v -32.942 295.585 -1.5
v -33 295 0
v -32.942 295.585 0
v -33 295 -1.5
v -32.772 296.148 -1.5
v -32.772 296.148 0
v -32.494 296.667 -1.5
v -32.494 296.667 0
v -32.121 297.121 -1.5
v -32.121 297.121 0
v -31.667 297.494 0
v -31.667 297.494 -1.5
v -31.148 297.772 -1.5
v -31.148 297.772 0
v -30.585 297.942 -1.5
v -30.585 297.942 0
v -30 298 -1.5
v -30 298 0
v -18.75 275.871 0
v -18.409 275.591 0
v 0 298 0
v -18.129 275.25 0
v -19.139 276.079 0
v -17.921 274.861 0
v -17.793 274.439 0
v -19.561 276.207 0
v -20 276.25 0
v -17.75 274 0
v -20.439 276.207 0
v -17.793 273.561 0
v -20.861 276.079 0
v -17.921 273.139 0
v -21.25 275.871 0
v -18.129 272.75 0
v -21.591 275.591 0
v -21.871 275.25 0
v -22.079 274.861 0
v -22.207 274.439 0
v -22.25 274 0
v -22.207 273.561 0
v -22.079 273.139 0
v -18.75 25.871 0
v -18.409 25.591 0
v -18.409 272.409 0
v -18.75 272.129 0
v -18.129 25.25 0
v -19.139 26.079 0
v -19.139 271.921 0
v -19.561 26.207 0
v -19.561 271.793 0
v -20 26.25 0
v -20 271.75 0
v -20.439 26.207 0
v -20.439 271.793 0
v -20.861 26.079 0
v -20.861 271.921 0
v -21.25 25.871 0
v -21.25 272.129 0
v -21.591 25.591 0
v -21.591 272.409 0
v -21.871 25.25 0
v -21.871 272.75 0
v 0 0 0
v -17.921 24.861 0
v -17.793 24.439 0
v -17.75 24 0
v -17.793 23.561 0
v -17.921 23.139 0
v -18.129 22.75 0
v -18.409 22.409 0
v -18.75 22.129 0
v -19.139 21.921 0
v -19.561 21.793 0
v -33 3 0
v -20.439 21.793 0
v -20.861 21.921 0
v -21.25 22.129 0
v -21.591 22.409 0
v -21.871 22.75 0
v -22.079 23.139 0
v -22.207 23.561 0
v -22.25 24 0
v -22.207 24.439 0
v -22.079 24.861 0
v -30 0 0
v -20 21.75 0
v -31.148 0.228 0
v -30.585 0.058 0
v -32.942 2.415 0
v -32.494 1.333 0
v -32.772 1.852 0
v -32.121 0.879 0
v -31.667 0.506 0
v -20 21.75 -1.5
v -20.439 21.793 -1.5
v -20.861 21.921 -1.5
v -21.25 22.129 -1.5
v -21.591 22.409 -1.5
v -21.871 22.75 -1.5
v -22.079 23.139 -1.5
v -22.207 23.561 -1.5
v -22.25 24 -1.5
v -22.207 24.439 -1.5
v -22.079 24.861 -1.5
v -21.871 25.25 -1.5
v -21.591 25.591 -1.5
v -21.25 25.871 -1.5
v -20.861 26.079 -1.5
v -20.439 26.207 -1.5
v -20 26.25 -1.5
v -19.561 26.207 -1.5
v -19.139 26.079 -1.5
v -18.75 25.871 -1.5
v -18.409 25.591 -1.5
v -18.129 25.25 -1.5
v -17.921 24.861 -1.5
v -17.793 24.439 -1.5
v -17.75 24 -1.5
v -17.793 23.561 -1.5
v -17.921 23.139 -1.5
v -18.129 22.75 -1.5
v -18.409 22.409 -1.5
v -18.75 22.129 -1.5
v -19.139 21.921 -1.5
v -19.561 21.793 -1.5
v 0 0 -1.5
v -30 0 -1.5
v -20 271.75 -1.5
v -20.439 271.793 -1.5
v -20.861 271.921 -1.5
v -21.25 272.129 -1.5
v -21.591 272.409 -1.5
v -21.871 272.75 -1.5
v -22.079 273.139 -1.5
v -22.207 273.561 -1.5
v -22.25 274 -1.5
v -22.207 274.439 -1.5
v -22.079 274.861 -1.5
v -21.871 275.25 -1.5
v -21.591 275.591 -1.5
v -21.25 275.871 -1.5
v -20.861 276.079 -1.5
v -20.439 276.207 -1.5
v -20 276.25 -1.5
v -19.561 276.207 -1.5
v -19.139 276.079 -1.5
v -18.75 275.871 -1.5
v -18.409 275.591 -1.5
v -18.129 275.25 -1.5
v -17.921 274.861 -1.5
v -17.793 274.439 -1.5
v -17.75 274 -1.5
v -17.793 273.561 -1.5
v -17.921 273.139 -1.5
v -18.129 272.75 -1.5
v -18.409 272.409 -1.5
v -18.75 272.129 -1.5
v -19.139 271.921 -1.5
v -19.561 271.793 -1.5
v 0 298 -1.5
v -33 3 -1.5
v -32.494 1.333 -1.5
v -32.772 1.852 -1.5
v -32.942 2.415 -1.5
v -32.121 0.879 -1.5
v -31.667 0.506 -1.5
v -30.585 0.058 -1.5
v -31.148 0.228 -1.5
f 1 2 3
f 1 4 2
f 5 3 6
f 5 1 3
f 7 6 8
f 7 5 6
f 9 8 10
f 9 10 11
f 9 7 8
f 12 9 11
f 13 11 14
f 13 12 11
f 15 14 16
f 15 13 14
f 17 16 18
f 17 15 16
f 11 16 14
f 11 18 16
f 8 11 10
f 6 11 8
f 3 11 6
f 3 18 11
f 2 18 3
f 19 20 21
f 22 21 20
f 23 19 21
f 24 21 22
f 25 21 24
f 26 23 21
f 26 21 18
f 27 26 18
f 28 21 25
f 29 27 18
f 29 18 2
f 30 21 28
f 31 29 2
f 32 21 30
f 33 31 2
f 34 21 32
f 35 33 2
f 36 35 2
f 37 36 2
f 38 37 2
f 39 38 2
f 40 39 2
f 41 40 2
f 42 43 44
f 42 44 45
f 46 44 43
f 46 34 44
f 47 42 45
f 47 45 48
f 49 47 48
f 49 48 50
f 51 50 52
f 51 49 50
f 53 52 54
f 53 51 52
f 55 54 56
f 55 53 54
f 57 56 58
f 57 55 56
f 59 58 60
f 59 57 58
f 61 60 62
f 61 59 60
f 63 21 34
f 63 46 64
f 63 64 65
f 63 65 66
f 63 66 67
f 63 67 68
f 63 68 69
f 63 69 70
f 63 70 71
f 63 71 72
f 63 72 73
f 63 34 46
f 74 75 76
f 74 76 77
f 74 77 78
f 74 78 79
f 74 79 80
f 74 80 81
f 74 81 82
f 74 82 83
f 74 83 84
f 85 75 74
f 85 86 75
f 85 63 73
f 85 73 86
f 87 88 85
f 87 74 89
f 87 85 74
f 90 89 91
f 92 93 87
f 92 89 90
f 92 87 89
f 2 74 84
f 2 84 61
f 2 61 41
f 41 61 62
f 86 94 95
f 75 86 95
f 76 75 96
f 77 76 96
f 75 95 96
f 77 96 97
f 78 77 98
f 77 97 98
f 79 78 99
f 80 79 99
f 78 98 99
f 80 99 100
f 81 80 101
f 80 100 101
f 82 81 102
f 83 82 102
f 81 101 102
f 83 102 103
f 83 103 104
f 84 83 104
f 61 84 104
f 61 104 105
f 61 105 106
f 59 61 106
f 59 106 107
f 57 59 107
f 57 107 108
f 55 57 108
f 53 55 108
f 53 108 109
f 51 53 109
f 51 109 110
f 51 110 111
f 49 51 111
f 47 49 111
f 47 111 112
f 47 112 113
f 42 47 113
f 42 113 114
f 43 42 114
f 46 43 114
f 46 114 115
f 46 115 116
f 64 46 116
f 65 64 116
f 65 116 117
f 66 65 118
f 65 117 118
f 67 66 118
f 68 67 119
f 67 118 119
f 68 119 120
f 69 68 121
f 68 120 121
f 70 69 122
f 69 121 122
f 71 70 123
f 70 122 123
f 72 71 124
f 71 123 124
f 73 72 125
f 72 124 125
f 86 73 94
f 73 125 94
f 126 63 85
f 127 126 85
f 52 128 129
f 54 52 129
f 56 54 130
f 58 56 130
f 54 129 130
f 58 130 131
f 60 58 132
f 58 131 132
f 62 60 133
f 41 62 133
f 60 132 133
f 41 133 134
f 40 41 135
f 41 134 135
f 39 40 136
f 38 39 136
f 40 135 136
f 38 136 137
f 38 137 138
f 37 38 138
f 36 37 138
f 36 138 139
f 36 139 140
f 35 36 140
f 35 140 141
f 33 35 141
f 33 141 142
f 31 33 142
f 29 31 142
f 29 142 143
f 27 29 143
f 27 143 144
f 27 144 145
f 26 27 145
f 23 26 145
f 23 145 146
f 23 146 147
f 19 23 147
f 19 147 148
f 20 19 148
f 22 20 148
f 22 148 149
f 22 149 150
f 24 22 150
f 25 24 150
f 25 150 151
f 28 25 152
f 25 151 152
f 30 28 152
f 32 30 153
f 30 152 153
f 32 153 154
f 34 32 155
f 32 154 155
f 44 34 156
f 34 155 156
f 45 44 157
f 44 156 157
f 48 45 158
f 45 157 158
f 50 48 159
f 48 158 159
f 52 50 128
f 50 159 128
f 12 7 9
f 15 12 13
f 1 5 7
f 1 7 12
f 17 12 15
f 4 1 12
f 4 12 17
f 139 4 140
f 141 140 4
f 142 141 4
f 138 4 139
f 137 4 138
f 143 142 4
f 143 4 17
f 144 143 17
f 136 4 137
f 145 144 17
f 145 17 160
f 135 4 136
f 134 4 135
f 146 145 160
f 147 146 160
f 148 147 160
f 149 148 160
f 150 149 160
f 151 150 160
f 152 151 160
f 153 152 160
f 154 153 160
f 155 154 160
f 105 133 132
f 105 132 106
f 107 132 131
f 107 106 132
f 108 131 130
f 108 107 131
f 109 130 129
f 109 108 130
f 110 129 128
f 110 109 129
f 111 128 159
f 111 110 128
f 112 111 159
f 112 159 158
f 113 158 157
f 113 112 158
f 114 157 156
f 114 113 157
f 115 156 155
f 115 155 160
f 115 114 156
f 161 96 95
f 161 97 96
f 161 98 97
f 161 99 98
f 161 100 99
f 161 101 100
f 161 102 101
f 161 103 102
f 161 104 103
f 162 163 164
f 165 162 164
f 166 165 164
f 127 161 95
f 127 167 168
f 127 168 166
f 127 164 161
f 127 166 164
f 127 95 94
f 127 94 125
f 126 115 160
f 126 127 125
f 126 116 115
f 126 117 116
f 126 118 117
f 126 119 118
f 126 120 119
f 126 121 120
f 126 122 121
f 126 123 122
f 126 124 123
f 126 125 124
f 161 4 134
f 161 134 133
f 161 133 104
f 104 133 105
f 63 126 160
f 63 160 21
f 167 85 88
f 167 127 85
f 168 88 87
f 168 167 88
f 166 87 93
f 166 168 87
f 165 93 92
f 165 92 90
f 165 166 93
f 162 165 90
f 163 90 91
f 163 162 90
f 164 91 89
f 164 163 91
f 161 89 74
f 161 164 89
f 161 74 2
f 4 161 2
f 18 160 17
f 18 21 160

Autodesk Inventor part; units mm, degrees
ref_plane "YZ Plane" through (0, 0, 0) normal (1, 0, 0) x (0, 1, 0)
ref_plane "XZ Plane" through (0, 0, 0) normal (0, 1, 0) x (-1, 0, 0)
ref_plane "XY Plane" through (0, 0, 0) normal (0, 0, 1) x (1, 0, 0)
sketch "Skizze1" plane through (0, 0, 0) normal (0, 1, 0) x (-1, 0, 0)
  line L0 (0, 0) -> (40, 0)
  line L1 (40, 0) -> (40, -1.5)
  line L2 (40, -1.5) -> (0, -1.5)
  line L3 (0, -1.5) -> (0, 0)
  dimension "d0" = 40
  dimension "d1" = 1.5
extrude "Extrusion1" add sketch "Skizze1" along normal blind 298
sketch "Skizze2" plane through (-40, 0, 0) normal (0, 0, 1) x (1, 0, 0)
  line L0 (0, 298) -> (40, 298) projected
  line L1 (40, 0) -> (40, 298) projected
  point P0 (20, 24)
  point P1 (20, 274)
  dimension "d4" = 250
  dimension "d5" = 298
  dimension "d6" = 24
  dimension "d7" = 20
  dimension "d8" = 20
hole "Bohrung1" at (-20, 24, 0) at (-20, 274, 0) direction (0, 0, -1) diameter 4.5 depth 11.8 tip angle 118
sketch "Skizze3" plane through (-40, 0, 0) normal (0, 0, 1) x (1, 0, 0)
  line L0 (0, 0) -> (0, 298) projected
  line L1 (0, 0) -> (7, 0)
  line L2 (7, 0) -> (7, 298)
  line L3 (7, 298) -> (0, 298)
  line L4 (0, 298) -> (0, 0)
  point P0 (40, 0)
  dimension "d16" = 7
  dimension "d17" = 298
extrude "Extrusion2" cut sketch "Skizze3" against normal blind 298
fillet "Rundung1" radius 3 2 edges at (-33, 0, -0.75) (-33, 298, -0.75)
properties part number "Deckelanschlag"
